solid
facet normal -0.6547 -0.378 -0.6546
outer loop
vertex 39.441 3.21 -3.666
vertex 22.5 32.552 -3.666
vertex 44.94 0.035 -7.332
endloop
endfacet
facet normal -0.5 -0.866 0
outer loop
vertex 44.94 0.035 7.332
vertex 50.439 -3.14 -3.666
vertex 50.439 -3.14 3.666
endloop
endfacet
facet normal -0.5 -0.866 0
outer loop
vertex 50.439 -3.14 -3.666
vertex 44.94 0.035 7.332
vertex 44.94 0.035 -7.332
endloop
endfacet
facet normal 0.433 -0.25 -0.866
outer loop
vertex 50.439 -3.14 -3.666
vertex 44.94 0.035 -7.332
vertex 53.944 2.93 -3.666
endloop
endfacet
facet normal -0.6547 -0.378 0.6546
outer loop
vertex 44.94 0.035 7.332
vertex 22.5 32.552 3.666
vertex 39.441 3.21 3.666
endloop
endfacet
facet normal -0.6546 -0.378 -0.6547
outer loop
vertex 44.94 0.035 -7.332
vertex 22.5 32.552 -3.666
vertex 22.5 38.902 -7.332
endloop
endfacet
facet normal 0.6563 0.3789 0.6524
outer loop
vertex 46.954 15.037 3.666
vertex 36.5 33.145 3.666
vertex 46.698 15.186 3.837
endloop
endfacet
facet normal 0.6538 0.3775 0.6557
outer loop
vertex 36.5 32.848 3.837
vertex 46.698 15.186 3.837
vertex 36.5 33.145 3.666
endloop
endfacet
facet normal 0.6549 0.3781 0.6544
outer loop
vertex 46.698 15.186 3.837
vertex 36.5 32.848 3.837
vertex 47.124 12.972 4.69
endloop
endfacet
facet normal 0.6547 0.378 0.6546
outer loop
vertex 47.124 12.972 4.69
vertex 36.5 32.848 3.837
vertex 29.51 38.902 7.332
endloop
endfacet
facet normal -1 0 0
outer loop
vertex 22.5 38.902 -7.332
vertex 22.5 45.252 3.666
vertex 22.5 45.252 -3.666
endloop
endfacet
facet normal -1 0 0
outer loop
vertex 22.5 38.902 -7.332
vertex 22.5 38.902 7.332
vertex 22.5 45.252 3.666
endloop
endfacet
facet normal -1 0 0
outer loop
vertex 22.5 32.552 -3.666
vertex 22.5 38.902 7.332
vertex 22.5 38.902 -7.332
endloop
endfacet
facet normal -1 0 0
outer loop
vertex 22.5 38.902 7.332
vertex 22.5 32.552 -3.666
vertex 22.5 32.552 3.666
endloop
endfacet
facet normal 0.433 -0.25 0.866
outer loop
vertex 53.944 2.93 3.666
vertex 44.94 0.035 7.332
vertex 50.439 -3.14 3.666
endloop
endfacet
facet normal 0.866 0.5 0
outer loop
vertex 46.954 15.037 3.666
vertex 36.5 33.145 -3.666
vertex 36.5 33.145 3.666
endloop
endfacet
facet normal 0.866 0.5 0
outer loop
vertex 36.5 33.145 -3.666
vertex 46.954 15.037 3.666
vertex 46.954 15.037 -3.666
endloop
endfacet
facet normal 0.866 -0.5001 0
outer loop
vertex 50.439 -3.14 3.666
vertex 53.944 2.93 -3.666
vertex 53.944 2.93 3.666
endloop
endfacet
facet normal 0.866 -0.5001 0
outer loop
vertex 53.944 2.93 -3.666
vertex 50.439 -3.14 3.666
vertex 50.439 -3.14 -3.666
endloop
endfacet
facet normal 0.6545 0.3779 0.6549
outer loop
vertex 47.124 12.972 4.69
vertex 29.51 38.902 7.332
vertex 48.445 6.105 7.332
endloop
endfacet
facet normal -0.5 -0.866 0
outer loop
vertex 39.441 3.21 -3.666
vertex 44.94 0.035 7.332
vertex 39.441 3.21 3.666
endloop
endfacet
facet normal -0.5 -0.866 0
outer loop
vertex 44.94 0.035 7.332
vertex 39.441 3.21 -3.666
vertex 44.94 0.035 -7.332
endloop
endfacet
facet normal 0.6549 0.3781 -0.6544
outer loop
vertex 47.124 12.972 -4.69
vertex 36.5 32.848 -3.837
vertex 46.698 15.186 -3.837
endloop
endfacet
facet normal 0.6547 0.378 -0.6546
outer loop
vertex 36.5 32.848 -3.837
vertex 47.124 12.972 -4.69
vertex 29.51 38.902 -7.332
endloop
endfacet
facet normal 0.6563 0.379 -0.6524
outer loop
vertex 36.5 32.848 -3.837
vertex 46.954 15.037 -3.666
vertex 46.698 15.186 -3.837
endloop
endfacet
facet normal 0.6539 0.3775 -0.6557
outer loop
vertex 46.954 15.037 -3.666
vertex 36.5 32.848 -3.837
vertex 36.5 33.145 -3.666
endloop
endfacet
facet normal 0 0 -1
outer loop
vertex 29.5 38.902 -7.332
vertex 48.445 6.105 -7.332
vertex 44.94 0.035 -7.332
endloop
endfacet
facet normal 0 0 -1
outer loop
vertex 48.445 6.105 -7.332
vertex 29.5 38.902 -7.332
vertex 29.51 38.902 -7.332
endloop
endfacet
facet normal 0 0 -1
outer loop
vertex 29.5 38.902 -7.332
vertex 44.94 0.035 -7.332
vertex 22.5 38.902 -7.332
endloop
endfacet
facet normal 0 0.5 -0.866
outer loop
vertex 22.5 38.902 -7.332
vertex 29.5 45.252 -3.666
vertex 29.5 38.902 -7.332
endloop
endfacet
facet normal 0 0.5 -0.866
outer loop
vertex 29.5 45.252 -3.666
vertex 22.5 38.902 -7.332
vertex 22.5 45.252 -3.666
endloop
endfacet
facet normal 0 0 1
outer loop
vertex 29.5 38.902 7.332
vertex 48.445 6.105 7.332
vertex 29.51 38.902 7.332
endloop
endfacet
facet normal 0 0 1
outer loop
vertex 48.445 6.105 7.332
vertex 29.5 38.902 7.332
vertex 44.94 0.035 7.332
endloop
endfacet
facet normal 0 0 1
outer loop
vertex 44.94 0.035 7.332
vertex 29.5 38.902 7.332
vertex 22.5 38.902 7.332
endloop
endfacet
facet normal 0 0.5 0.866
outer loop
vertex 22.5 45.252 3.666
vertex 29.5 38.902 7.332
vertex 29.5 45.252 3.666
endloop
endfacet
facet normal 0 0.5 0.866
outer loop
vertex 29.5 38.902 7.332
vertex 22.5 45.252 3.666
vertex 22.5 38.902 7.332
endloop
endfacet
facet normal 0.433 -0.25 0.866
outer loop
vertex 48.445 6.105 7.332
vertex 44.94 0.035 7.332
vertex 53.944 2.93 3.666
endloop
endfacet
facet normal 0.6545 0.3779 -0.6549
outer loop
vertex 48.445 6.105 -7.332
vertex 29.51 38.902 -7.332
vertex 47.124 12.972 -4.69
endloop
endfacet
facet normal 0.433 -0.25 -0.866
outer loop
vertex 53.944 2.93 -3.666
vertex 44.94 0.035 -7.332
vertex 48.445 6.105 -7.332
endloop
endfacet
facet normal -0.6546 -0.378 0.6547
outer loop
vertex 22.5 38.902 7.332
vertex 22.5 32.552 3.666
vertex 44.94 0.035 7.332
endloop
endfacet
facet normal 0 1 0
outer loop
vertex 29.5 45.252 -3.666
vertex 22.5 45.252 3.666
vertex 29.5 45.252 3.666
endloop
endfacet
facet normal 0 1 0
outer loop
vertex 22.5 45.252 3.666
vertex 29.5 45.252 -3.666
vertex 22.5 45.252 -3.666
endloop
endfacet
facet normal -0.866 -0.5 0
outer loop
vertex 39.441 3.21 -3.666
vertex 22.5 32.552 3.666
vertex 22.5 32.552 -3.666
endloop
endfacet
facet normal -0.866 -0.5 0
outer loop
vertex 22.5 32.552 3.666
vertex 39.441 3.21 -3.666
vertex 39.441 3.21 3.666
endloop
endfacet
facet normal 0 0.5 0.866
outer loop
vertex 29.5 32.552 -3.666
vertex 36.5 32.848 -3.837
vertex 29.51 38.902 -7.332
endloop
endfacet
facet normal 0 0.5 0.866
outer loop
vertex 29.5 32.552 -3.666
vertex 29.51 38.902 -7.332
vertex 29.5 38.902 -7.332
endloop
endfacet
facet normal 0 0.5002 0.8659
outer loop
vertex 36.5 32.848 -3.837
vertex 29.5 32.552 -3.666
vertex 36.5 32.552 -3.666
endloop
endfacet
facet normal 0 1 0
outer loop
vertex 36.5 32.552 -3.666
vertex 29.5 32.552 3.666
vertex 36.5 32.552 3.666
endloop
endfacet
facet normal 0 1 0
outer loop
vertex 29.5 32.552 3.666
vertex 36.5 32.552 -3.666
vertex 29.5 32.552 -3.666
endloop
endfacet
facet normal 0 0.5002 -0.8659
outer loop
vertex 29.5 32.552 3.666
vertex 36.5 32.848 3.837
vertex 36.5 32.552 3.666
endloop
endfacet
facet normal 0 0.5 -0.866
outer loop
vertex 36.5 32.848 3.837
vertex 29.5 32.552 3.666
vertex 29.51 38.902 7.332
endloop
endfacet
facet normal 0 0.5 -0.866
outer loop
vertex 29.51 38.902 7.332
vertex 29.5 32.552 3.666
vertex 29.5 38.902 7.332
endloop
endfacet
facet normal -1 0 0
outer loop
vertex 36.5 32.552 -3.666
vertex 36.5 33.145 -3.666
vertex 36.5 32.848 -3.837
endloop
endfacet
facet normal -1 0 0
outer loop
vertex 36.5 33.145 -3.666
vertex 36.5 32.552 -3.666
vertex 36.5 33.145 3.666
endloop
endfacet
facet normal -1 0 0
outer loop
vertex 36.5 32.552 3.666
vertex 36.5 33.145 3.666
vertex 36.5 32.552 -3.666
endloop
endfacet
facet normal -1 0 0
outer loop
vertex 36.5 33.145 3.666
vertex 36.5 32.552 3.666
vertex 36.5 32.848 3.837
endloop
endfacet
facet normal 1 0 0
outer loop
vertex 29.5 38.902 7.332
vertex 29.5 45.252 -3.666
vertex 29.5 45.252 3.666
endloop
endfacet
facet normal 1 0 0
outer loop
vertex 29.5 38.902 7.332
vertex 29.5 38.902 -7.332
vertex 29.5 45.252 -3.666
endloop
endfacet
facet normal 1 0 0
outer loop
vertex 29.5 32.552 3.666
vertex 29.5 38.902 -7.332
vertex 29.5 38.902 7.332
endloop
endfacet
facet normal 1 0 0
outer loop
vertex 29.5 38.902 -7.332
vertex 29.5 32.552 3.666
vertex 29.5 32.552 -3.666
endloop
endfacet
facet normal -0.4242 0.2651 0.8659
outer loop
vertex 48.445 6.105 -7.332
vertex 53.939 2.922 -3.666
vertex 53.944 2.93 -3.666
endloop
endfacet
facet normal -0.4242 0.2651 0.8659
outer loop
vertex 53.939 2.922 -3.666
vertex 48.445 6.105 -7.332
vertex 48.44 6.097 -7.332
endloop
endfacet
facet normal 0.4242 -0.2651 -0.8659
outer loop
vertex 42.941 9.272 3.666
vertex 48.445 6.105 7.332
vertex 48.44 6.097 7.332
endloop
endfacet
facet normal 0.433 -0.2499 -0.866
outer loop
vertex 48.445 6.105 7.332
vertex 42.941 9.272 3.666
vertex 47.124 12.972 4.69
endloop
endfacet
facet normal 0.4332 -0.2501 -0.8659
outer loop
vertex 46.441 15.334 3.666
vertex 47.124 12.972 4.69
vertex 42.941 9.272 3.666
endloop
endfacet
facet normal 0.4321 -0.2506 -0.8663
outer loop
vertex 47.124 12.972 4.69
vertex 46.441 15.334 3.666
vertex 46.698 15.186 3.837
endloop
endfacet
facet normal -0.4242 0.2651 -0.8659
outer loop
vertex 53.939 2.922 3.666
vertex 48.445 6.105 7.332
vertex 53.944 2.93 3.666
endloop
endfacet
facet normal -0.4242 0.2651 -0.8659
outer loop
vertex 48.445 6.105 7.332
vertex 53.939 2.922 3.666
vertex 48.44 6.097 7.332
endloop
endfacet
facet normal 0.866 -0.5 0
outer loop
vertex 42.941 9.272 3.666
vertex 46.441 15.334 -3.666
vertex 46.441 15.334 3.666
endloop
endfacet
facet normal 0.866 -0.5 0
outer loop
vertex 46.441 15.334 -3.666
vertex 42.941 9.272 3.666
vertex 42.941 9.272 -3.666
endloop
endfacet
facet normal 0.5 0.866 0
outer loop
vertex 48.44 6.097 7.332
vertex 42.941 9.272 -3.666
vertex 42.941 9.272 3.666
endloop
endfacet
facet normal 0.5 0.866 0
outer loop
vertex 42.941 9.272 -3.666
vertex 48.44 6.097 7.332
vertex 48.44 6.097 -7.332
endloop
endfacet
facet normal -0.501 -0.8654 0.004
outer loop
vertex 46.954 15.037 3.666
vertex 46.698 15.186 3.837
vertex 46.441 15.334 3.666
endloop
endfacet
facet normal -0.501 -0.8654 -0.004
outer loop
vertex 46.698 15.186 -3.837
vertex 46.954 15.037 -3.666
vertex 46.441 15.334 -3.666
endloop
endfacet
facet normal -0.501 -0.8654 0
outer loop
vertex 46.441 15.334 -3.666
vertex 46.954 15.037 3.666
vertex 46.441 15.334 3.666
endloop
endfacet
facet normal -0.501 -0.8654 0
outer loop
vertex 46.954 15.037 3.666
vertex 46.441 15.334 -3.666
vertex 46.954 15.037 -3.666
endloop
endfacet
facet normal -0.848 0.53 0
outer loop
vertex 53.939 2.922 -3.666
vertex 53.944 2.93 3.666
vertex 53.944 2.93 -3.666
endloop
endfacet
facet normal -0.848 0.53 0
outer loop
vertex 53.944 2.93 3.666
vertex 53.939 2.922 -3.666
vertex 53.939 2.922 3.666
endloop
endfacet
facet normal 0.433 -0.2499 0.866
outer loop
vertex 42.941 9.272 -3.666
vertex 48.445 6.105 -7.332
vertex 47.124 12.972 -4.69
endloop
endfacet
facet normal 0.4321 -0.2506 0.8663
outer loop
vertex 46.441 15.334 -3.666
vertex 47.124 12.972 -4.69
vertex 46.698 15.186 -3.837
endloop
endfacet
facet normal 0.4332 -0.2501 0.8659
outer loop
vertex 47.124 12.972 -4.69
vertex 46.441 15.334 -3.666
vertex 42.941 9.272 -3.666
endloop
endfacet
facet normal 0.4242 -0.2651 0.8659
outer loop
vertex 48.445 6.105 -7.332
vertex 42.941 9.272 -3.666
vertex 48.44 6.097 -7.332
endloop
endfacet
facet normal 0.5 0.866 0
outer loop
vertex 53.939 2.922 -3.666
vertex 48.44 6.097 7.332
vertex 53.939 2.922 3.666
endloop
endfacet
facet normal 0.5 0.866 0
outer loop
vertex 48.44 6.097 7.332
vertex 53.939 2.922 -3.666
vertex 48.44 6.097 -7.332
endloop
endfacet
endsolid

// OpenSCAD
// diameter of the tube (mm)
tubeDiameter = 2.197*25.4; 

// hole size of the bearing (mm)
bearingHoleDiameter = 8;

// bearing diameter (mm)
bearingDiameter = 22;

// bearing width (mm)
bearingWidth = 7;

// bearing collar thickness (mm)
bearingCollarThickness = 2;

// minimum thickness of the walls (mm)
wallThickness = 15;

// minimum thickness of the walls (mm)
wallHeight = 0;

// the space between the bearing and the wall (mm)
tolerance = 2;

// the space between the tube and the wall (mm)
tubeTolerance = 2;

// determines beefiness of edge extensions
beefiness = 2;//9;

reinforcement = 7;

hexHead = 25.4/2;

module Outer() {
translate([bearingWidth/2,tubeDiameter/2+bearingDiameter/2,0])
    rotate([0,90,0]) union() {
        hull() {
                cylinder(r=bearingHoleDiameter/2+bearingCollarThickness,h=0.01,$fn=90);
                translate([0,0,tolerance])
                    cylinder(r=bearingHoleDiameter/2+bearingCollarThickness+tolerance,h=0.01,$fn=90);
        }
        translate([-bearingDiameter/2-wallHeight,-bearingDiameter/2-wallThickness,tolerance])
            cube([bearingDiameter+2*wallHeight,bearingDiameter+wallThickness+2*tolerance,wallThickness]);
        hull() {
                translate([0,0,2*tolerance+wallThickness])
                    cylinder(r=bearingHoleDiameter/2+bearingCollarThickness,h=0.01,$fn=90);
                translate([0,0,tolerance+wallThickness])
                    cylinder(r=bearingHoleDiameter/2+bearingCollarThickness+tolerance,h=0.01,$fn=90);
        }
    }
}

module cylinder_outer(height,radius,fn){
   fudge = 1/cos(180/fn);
   cylinder(h=height,r=radius*fudge,$fn=fn);
}
fudge = 1/cos(180/6);
module BraceSingle() {
translate([bearingWidth/2,tubeDiameter/2+bearingDiameter/2,0])
    rotate([0,90,0]) union() {
        hull() {
                translate([0,0,2*tolerance+wallThickness])
                    cylinder(r=fudge*hexHead/2,h=0.01,$fn=6);
                translate([0,0,2*tolerance+wallThickness+reinforcement])
                    cylinder(r=fudge*hexHead/2,h=0.01,$fn=6);
        }
    }
}

module BraceReliefSingle() {
translate([bearingWidth/2,tubeDiameter/2+bearingDiameter/2,0])
    rotate([0,90,0]) union() {
        hull() {
                translate([0,0,2*tolerance+wallThickness+reinforcement])
                    cylinder(r=fudge*hexHead/2,h=reinforcement,$fn=6);
        }
    }
}

module Inner() {
    translate([bearingWidth/2,tubeDiameter/2+bearingDiameter/2,0])
        rotate([0,90,0]) 
            cylinder(r=bearingHoleDiameter/2,h=100, $fn=90); // arbitrary large value for hole length
}

module Bearing() {
    translate([0,tubeDiameter/2+bearingDiameter/2,0])
        rotate([0,90,0]) color("red", 0.5)
            cylinder(r=bearingDiameter/2,h=bearingWidth, center=true, $fn=90); 
}

module Tube() {
    color("green", 0.5)
        cylinder(r=tubeDiameter/2,h=100, center=true, $fn=90); 
}

testFit = true;

module Roller()
{
    for (m=[[0,0,0],[1,0,0]]) mirror(m) {
        if (testFit) {
            Bearing();
            rotate([0,0,-120]) Bearing();
            Tube();
        }

        difference() {
            union() {
                color("blue", 0.5) Brace();
                Outer();
                rotate([0,0,-120]) mirror([1,0,0]) Outer();
                translate([sin(60)*(tubeDiameter/2-wallThickness/2),cos(60)*(tubeDiameter/2-wallThickness/2),0]) {
                    hull() {
                        translate([0,tubeDiameter/2+beefiness,0])
                            cylinder(r=0.01,h=bearingDiameter+2*wallHeight, center=true, $fn=90);
                        rotate([0,0,-120]) {
                            translate([0,tubeDiameter/2+beefiness,0]) 
                                cylinder(r=0.01,h=bearingDiameter+2*wallHeight, center=true, $fn=90);
                        }
                        cylinder(r=0.01,h=bearingDiameter+2*wallHeight, center=true, $fn=90);
                    }
                }
                translate([-wallThickness-tolerance-bearingWidth/2,tubeDiameter/2+bearingDiameter+tolerance,-(bearingDiameter+2*wallHeight)/2])
                    cube([2*wallThickness+2*tolerance+bearingWidth,wallThickness,bearingDiameter+2*wallHeight]);
            }
            cylinder(r=tubeDiameter/2+tubeTolerance,h=bearingDiameter+2*wallThickness, center=true, $fn=90);
            Inner();
            rotate([0,0,-120]) mirror([1,0,0]) Inner();
        }
    }
}

//Roller();

module Brace()
{
    color("blue", 0.5) difference() {
        hull() {
            BraceSingle();
            rotate([0,0,-120]) mirror([1,0,0]) BraceSingle();
        }
        BraceReliefSingle();
        rotate([0,0,-120]) mirror([1,0,0]) BraceReliefSingle();
    }
}

Brace();
